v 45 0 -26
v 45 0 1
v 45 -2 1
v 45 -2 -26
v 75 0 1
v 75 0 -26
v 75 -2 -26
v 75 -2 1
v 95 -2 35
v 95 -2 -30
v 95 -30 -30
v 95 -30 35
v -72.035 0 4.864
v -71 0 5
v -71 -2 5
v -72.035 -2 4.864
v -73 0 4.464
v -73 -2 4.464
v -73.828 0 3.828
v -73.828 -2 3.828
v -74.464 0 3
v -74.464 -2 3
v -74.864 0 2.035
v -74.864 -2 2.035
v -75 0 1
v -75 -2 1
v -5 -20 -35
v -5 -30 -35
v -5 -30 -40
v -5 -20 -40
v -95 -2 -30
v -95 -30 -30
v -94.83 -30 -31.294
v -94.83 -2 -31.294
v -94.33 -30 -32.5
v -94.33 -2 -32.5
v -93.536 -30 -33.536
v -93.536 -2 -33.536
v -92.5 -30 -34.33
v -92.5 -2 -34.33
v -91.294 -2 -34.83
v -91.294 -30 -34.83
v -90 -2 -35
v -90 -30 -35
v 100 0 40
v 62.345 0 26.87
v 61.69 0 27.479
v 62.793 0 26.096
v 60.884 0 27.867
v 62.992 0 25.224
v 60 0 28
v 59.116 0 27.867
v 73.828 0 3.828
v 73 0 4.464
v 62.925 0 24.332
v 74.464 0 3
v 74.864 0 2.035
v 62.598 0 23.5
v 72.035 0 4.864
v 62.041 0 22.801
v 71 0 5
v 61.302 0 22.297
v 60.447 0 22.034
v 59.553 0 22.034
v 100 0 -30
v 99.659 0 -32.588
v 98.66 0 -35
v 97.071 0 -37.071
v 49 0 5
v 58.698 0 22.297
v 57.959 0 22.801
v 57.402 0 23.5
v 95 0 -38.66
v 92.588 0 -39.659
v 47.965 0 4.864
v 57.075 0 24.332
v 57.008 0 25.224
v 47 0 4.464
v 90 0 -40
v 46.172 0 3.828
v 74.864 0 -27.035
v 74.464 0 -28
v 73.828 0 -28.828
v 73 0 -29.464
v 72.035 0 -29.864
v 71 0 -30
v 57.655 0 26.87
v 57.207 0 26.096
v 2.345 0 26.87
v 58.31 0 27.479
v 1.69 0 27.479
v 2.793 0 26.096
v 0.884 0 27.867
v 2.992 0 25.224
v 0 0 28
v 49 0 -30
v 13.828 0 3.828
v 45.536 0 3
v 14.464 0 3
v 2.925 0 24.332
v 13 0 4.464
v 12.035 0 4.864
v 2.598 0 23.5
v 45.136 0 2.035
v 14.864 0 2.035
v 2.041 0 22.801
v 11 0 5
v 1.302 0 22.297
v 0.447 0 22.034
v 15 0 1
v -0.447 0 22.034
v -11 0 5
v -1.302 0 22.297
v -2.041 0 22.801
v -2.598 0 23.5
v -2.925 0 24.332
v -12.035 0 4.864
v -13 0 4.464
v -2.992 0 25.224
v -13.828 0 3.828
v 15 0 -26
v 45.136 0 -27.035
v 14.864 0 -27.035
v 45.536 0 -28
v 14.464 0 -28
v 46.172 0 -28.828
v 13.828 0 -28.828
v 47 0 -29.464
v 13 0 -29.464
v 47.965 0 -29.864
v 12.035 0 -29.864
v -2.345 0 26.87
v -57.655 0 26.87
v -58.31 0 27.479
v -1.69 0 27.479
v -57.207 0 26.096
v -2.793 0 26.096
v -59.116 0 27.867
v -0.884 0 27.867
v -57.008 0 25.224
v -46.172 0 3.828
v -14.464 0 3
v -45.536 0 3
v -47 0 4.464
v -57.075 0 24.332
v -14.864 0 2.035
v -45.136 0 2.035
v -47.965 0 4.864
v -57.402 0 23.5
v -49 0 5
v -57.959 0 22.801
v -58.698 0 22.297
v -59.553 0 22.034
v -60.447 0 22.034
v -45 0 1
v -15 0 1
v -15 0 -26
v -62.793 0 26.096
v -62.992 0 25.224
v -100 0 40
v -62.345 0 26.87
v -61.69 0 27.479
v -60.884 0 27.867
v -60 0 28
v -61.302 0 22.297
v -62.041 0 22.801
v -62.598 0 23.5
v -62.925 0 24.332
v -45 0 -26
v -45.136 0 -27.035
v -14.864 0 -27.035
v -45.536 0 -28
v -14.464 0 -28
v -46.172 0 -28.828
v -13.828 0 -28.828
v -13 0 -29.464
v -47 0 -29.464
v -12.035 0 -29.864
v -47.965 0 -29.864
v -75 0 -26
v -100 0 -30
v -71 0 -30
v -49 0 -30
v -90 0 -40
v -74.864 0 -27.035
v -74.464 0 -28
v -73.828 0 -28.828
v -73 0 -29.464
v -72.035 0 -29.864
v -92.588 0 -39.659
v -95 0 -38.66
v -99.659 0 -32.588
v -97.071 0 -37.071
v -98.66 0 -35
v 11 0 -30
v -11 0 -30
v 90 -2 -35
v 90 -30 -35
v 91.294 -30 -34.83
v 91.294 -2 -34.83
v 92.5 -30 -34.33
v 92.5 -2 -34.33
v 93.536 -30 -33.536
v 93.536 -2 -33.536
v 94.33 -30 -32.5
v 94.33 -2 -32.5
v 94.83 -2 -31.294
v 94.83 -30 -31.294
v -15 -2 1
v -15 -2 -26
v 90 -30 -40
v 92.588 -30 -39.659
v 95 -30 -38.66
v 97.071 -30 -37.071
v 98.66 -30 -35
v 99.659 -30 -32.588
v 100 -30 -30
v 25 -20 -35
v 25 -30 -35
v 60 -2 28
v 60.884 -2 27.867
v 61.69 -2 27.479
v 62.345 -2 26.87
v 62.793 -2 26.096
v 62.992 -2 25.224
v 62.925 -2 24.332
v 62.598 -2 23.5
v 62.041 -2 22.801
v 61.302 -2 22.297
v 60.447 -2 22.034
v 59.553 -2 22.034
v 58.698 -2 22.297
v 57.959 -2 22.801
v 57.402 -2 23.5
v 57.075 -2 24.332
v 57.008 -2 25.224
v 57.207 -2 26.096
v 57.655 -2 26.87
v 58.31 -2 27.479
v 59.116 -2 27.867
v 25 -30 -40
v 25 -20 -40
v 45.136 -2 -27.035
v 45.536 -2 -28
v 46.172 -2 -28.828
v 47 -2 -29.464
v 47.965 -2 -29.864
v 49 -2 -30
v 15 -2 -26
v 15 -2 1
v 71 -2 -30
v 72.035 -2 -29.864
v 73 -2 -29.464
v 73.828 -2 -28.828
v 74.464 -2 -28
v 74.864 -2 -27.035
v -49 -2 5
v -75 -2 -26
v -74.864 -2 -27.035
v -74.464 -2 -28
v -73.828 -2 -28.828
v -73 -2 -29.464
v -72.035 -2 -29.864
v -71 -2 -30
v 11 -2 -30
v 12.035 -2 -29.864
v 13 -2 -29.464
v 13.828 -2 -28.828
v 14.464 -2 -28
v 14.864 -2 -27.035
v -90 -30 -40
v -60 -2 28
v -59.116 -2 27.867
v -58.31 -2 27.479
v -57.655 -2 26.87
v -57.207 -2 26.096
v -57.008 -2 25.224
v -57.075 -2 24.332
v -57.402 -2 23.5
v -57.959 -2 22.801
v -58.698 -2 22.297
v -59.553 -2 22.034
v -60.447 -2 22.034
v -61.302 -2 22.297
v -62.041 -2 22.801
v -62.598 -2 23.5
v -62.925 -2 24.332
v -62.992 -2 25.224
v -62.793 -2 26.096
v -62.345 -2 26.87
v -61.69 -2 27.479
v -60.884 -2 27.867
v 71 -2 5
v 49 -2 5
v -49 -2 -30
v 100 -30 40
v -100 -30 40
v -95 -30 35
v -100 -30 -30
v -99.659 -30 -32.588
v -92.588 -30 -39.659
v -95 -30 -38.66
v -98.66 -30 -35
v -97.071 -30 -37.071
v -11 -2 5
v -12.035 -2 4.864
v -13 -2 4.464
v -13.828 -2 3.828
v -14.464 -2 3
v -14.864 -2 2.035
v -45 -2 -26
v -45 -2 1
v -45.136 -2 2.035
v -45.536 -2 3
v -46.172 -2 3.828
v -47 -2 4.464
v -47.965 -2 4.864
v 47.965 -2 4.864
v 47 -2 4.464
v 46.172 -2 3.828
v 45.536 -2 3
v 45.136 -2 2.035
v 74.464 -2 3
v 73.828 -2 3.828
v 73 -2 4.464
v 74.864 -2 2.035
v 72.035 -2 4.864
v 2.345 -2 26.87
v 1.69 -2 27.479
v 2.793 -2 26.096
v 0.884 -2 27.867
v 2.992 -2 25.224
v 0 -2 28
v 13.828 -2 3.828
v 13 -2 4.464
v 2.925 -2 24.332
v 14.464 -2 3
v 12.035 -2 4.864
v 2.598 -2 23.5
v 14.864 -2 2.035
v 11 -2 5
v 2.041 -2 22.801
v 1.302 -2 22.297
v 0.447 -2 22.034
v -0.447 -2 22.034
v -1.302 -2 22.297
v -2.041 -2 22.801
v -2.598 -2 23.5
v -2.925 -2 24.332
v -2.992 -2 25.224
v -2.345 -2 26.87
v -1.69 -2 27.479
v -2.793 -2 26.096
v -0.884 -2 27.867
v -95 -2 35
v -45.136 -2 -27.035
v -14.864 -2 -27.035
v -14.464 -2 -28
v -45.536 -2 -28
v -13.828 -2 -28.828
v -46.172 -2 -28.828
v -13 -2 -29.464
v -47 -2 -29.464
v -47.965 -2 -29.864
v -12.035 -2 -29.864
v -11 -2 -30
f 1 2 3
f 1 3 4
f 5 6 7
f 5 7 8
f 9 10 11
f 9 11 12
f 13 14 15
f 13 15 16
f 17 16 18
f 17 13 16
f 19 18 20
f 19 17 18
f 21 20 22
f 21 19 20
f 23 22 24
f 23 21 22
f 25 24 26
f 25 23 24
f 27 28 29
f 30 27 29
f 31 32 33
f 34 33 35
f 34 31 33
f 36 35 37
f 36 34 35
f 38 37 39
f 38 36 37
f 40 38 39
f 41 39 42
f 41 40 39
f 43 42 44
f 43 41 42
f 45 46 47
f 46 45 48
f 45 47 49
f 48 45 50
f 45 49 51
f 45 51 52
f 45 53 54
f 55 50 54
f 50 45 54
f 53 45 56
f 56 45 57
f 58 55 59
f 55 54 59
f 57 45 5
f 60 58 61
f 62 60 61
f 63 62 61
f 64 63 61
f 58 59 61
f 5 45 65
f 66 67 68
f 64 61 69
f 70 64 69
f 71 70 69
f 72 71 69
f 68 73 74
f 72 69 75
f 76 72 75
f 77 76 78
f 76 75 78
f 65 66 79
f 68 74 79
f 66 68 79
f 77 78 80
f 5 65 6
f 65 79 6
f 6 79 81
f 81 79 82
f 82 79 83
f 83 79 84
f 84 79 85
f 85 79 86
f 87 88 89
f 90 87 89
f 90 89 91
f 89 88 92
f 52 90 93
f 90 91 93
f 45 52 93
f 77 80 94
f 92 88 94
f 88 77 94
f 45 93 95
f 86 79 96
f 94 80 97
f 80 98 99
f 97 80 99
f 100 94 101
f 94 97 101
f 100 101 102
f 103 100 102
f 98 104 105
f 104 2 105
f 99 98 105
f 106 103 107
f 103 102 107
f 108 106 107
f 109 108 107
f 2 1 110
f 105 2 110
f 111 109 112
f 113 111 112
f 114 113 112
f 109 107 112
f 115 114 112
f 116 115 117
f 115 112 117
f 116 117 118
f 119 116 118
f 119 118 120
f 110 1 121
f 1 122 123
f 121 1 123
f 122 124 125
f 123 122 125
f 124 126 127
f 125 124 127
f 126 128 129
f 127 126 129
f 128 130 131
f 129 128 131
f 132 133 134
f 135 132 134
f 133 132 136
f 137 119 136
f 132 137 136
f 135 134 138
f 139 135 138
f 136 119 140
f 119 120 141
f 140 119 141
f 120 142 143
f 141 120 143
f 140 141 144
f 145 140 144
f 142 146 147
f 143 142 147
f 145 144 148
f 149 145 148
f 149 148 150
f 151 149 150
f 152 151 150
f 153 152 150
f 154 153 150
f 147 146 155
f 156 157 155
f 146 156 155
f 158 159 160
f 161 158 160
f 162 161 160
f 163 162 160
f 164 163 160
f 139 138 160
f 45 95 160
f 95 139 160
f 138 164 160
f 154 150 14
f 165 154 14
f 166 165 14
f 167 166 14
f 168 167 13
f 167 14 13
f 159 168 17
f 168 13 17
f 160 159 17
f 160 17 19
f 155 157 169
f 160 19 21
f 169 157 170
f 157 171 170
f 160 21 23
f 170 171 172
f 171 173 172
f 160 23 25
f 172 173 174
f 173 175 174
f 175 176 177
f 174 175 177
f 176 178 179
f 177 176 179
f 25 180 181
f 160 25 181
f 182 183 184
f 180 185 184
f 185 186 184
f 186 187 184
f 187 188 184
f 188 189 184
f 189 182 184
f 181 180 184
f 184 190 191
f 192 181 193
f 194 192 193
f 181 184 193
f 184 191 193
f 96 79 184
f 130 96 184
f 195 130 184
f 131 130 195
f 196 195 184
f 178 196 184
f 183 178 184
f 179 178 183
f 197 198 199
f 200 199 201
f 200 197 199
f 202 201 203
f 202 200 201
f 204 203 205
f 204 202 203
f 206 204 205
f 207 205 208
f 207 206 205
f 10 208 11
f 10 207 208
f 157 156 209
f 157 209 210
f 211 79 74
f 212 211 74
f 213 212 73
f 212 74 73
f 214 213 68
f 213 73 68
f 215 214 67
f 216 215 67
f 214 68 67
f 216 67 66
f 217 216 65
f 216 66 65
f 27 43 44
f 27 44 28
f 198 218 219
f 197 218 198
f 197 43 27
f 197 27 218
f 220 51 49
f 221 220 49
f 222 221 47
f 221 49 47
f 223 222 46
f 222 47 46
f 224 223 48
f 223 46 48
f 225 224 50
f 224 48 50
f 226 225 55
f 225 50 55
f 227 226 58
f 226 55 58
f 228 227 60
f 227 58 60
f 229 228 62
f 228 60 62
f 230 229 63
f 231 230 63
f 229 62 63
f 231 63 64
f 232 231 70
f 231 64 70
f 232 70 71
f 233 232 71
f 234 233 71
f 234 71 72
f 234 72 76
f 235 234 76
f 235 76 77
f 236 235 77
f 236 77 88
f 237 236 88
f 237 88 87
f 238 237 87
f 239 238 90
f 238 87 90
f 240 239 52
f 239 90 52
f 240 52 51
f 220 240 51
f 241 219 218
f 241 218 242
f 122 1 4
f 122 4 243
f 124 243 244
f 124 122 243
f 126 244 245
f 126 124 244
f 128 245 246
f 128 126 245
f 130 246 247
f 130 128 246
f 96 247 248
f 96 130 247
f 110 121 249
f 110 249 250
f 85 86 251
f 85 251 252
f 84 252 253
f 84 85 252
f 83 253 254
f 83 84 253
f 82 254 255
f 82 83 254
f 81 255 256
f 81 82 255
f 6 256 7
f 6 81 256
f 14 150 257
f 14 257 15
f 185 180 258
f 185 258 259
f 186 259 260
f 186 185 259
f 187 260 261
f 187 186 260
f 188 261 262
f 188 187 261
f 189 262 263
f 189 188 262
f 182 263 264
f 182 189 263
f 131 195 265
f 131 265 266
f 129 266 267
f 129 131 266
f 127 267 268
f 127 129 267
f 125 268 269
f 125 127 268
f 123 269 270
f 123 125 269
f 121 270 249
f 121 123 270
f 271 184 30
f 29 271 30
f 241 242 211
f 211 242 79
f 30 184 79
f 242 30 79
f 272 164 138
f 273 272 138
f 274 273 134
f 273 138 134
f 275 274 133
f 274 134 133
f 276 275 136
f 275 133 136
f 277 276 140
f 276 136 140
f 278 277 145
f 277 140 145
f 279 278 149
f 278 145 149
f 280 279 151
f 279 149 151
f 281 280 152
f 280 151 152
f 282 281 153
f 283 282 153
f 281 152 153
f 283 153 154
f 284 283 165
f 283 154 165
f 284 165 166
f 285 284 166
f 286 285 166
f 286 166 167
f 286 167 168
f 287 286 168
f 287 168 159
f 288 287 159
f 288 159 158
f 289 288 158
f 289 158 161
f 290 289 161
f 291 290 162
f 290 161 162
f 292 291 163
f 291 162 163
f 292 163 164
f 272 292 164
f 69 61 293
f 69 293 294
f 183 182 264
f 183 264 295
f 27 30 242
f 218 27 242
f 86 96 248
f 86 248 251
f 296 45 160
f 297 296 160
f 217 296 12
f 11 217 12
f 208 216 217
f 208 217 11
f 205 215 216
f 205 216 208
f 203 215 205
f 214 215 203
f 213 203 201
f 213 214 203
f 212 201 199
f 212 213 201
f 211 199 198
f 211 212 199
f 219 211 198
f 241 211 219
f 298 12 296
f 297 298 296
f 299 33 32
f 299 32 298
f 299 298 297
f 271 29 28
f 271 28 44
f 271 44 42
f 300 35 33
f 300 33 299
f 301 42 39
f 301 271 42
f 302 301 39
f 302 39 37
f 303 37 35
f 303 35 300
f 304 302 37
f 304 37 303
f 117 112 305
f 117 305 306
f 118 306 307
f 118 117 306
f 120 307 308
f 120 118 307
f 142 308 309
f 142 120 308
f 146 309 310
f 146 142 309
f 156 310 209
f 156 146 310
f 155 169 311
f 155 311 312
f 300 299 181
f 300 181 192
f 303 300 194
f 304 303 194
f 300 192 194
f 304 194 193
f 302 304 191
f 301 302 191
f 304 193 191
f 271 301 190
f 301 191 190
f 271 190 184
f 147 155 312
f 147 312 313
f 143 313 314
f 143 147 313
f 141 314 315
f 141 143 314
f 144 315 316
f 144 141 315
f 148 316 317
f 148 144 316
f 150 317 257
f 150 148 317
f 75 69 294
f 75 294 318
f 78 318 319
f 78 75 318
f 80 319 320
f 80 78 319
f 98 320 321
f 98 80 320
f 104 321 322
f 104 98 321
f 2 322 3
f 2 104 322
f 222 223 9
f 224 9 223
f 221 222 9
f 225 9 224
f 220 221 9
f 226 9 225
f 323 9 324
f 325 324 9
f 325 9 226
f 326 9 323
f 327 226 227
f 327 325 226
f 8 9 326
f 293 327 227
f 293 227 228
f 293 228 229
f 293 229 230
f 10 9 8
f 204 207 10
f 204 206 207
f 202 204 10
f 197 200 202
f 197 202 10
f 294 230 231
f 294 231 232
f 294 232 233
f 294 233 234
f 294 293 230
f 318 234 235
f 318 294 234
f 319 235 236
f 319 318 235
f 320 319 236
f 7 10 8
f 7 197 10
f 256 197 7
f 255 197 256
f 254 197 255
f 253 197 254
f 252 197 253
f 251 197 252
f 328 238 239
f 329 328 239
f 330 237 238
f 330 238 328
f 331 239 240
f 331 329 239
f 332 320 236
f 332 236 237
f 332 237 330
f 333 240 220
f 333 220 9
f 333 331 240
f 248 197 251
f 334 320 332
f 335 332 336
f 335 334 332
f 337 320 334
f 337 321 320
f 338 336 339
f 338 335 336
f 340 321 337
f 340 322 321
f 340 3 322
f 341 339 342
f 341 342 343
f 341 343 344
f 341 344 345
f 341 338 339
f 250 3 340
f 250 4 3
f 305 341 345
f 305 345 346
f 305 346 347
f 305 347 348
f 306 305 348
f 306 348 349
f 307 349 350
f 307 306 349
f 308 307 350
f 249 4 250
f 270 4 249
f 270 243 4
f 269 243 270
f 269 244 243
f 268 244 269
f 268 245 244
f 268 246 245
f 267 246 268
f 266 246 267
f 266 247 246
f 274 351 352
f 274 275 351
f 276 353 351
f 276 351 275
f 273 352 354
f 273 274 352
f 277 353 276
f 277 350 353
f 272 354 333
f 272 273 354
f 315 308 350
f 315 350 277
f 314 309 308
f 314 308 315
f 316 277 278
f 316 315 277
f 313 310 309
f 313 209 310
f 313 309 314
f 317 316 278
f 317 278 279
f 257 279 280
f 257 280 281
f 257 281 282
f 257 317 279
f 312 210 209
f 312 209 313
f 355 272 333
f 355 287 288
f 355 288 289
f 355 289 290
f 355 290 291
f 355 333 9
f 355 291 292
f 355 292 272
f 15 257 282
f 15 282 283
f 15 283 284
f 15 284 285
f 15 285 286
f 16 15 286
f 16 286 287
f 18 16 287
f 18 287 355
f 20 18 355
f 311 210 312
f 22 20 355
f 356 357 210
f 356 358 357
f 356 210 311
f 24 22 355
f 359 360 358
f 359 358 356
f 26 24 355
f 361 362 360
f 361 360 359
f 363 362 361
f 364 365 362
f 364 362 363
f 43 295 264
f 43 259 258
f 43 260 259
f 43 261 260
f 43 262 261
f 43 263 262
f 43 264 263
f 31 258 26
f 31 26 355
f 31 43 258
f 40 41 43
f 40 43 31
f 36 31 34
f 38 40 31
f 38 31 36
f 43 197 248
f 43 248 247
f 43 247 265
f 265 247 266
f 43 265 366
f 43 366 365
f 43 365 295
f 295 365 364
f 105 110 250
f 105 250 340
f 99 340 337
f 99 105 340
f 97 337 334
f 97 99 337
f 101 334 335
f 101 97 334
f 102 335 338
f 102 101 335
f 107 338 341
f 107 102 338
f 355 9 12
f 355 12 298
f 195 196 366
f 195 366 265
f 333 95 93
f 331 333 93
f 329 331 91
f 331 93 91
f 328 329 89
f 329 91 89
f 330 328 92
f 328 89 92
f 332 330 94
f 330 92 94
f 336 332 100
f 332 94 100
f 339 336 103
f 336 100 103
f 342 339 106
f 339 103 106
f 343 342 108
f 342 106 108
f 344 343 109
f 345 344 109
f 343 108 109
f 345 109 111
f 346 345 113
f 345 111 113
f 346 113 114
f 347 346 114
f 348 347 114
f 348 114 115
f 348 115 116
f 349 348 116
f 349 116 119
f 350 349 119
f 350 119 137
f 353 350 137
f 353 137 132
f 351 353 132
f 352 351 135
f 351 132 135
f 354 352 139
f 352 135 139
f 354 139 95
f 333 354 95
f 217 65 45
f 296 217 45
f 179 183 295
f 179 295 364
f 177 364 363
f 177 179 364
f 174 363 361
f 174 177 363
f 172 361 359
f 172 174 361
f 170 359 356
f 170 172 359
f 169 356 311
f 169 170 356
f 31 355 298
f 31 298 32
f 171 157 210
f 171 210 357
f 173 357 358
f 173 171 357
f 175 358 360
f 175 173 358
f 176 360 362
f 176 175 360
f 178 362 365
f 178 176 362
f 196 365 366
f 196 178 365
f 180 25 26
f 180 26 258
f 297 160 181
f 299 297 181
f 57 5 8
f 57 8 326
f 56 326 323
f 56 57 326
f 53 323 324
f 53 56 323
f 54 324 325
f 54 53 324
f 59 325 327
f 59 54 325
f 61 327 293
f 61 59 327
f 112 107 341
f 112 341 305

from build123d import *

# Parameters (mm, degrees)
SKETCH_1131_R          = 3
EXTRUDE_1145_DEPTH     = 2
EXTRUDE_1198_DEPTH     = 30
SKETCH_1301_W          = 30
SKETCH_1301_H          = 5
CUT_EXTRUDE_1405_DEPTH = 10


with BuildPart() as part:
    # Sketch 1131 → Extrude 1145 (new body)
    with BuildSketch(Plane(origin=(0, 0, 0), x_dir=(1, 0, 0), z_dir=(0, 1, 0))):
        with BuildLine():
            Line((-90, 40), (90, 40))
            ThreePointArc((90, 40), (97.071067812, 37.071067812), (100, 30))
            Line((100, 30), (100, -40))
            Line((100, -40), (-100, -40))
            Line((-100, -40), (-100, 30))
            ThreePointArc((-100, 30), (-97.071067812, 37.071067812), (-90, 40))
        make_face()
        with Locations(Location((60, -25, 0), (0, 0, 270))):
            Circle(SKETCH_1131_R, mode=Mode.SUBTRACT)
        with Locations(Location((0, -25, 0), (0, 0, 270))):
            Circle(SKETCH_1131_R, mode=Mode.SUBTRACT)
        with Locations(Location((-60, -25, 0), (0, 0, 270))):
            Circle(SKETCH_1131_R, mode=Mode.SUBTRACT)
        with BuildLine():
            Line((49, 30), (71, 30))
            ThreePointArc((71, 30), (73.828427125, 28.828427125), (75, 26))
            Line((75, 26), (75, -1))
            ThreePointArc((75, -1), (73.828427125, -3.828427125), (71, -5))
            Line((71, -5), (49, -5))
            ThreePointArc((49, -5), (46.171572875, -3.828427125), (45, -1))
            Line((45, -1), (45, 26))
            ThreePointArc((45, 26), (46.171572875, 28.828427125), (49, 30))
        make_face(mode=Mode.SUBTRACT)
        with BuildLine():
            Line((-11, 30), (11, 30))
            ThreePointArc((11, 30), (13.828427125, 28.828427125), (15, 26))
            Line((15, 26), (15, -1))
            ThreePointArc((15, -1), (13.828427125, -3.828427125), (11, -5))
            Line((11, -5), (-11, -5))
            ThreePointArc((-11, -5), (-13.828427125, -3.828427125), (-15, -1))
            Line((-15, -1), (-15, 26))
            ThreePointArc((-15, 26), (-13.828427125, 28.828427125), (-11, 30))
        make_face(mode=Mode.SUBTRACT)
        with BuildLine():
            Line((-71, 30), (-49, 30))
            ThreePointArc((-49, 30), (-46.171572875, 28.828427125), (-45, 26))
            Line((-45, 26), (-45, -1))
            ThreePointArc((-45, -1), (-46.171572875, -3.828427125), (-49, -5))
            Line((-49, -5), (-71, -5))
            ThreePointArc((-71, -5), (-73.828427125, -3.828427125), (-75, -1))
            Line((-75, -1), (-75, 26))
            ThreePointArc((-75, 26), (-73.828427125, 28.828427125), (-71, 30))
        make_face(mode=Mode.SUBTRACT)
    extrude(amount=-EXTRUDE_1145_DEPTH)

    # Sketch 1191 → Extrude 1198 (add)
    with BuildSketch(Plane(origin=(0, 0, 0), x_dir=(1, 0, 0), z_dir=(0, 1, 0))):
        with BuildLine():
            Line((-90, 40), (90, 40))
            ThreePointArc((90, 40), (97.071067812, 37.071067812), (100, 30))
            Line((100, 30), (100, -40))
            Line((100, -40), (-100, -40))
            Line((-100, -40), (-100, 30))
            ThreePointArc((-100, 30), (-97.071067812, 37.071067812), (-90, 40))
        make_face()
        with BuildLine():
            Line((-90, 35), (90, 35))
            ThreePointArc((90, 35), (93.535533906, 33.535533906), (95, 30))
            Line((95, 30), (95, -35))
            Line((95, -35), (-95, -35))
            Line((-95, -35), (-95, 30))
            ThreePointArc((-95, 30), (-93.535533906, 33.535533906), (-90, 35))
        make_face(mode=Mode.SUBTRACT)
    extrude(amount=-EXTRUDE_1198_DEPTH)

    # Sketch 1301 → Cut-Extrude 1405 (cut)
    with BuildSketch(Plane(origin=(0, -30, 0), x_dir=(1, 0, 0), z_dir=(0, 1, 0))):
        with Locations((10, 37.5)):
            Rectangle(SKETCH_1301_W, SKETCH_1301_H)
    extrude(amount=CUT_EXTRUDE_1405_DEPTH, mode=Mode.SUBTRACT)


solid = part.part
